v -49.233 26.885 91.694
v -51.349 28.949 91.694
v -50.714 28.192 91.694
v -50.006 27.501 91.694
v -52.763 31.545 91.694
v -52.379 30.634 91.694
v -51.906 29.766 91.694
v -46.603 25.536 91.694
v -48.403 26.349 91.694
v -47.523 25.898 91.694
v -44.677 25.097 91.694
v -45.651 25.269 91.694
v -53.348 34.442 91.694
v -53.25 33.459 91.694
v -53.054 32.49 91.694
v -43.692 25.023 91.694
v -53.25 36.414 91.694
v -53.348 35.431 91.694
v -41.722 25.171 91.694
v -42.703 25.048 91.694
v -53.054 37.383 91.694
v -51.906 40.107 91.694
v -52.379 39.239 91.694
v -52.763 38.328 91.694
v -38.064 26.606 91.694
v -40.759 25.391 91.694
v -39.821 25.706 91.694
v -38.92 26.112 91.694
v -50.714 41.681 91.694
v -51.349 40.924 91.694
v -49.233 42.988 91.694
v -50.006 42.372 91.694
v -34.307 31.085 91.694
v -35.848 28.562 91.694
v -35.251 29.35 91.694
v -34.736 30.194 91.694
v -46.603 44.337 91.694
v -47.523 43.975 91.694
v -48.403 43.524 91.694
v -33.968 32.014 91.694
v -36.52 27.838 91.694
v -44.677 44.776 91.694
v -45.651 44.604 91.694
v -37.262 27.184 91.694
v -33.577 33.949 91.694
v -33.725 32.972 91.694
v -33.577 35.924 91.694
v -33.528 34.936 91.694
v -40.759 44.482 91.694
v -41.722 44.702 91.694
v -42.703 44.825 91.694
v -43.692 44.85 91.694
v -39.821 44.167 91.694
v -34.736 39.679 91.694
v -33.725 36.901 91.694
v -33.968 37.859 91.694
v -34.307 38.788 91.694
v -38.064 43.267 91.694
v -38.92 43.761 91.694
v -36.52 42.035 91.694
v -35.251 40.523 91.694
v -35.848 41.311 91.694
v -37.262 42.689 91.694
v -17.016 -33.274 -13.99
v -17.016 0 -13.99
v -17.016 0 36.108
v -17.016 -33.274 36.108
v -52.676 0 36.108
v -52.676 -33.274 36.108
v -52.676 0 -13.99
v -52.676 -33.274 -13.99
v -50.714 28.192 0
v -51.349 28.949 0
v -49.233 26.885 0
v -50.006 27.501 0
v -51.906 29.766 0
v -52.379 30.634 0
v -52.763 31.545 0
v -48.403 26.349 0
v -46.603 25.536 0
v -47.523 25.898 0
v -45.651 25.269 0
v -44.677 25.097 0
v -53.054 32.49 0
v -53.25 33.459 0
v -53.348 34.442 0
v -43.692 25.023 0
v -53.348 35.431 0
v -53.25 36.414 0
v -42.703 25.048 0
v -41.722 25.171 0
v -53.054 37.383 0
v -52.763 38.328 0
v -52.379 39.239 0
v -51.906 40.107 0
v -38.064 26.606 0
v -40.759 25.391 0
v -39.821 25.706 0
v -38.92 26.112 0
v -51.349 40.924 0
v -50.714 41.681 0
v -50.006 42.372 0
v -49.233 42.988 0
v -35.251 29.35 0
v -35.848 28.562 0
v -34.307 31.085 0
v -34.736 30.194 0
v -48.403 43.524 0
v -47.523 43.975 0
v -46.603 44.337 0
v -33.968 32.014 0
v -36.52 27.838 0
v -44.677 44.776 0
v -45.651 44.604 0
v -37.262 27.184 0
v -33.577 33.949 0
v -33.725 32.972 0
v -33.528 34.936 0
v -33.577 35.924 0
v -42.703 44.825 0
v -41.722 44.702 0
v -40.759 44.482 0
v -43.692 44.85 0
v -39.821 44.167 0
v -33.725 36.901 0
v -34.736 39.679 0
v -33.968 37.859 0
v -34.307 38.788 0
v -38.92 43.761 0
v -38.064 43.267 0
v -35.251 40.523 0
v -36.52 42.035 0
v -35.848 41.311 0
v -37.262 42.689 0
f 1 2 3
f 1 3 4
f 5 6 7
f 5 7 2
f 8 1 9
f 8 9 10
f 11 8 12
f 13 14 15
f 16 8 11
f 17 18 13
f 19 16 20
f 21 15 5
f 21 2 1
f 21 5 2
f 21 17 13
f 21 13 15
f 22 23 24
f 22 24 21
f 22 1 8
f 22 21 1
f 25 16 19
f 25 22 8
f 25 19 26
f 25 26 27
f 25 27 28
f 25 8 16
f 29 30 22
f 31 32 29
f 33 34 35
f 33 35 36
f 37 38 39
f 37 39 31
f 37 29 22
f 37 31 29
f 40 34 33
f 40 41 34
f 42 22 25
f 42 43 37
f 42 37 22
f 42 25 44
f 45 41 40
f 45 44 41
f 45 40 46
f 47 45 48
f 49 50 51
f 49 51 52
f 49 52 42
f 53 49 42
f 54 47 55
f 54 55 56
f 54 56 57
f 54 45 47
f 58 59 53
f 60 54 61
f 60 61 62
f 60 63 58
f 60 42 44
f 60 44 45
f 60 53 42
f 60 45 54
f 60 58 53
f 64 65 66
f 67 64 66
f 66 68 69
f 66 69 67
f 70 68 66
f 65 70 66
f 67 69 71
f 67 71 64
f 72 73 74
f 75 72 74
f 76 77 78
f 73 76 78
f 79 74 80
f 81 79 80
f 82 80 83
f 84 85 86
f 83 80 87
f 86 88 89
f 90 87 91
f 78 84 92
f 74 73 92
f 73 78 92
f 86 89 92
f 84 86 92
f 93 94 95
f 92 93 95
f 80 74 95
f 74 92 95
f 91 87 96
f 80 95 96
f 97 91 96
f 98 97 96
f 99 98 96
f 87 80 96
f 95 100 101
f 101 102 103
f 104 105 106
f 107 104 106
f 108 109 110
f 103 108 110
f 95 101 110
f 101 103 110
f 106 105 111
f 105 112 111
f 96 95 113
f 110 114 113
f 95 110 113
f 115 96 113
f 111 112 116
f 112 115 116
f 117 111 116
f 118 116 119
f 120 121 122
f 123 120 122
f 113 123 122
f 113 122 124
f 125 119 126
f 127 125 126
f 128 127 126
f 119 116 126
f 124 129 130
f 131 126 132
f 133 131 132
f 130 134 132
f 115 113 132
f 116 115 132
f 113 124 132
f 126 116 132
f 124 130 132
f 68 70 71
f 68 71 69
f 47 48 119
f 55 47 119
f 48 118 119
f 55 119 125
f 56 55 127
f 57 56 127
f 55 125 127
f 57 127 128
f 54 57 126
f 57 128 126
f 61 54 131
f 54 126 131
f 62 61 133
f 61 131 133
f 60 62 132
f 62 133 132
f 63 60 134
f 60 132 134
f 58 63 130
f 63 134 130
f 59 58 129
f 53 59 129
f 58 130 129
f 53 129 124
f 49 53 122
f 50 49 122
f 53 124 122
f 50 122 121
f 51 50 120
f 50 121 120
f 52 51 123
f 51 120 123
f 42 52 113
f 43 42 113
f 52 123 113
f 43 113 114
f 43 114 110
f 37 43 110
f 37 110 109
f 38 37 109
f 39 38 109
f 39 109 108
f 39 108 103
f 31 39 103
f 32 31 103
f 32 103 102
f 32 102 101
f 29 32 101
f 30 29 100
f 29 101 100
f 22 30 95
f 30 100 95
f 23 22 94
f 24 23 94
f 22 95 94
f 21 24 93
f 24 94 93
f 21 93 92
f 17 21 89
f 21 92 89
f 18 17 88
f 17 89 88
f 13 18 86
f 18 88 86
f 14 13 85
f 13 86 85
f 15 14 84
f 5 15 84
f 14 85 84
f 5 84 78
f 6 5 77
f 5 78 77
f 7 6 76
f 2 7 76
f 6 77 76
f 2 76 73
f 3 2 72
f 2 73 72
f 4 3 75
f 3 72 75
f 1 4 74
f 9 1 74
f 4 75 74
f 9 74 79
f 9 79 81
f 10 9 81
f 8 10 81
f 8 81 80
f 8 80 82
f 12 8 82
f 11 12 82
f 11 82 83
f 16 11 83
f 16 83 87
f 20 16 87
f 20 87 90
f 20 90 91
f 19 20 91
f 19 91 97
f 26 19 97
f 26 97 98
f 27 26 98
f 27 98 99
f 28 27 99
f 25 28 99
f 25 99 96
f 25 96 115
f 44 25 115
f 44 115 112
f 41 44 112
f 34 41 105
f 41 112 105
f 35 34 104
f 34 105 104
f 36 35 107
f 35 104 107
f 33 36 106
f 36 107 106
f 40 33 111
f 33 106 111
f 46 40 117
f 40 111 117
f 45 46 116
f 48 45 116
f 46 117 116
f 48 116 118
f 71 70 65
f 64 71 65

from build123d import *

# Parameters (mm, degrees)
F0_R      = 9.916421
F1_DEPTH  = 54.356
F1_FACE_R = 9.916421
F2_DEPTH  = 37.338
F3_W      = 35.660567
F3_H      = 50.097799
F4_DEPTH  = 33.274


with BuildPart() as f1:
    # F0 (on Top) → F1 (new body)
    with BuildSketch(Plane.XY):
        with Locations((-43.444343, 34.936495)):
            Circle(F0_R)
    extrude(amount=F1_DEPTH)

    # F1_face (on face) → F2 (join)
    with BuildSketch(Plane(origin=(-43.444343, 34.936495, 54.356), x_dir=(1, 0, 0), z_dir=(0, 0, 1))):
        Circle(F1_FACE_R)
    extrude(amount=F2_DEPTH)


with BuildPart() as f4:
    # F3 (on Front) → F4 (new body)
    with BuildSketch(Plane.XZ):
        with Locations((-34.845985, 11.058819)):
            Rectangle(F3_W, F3_H)
    extrude(amount=F4_DEPTH)


solid = Compound([f1.part, f4.part])
